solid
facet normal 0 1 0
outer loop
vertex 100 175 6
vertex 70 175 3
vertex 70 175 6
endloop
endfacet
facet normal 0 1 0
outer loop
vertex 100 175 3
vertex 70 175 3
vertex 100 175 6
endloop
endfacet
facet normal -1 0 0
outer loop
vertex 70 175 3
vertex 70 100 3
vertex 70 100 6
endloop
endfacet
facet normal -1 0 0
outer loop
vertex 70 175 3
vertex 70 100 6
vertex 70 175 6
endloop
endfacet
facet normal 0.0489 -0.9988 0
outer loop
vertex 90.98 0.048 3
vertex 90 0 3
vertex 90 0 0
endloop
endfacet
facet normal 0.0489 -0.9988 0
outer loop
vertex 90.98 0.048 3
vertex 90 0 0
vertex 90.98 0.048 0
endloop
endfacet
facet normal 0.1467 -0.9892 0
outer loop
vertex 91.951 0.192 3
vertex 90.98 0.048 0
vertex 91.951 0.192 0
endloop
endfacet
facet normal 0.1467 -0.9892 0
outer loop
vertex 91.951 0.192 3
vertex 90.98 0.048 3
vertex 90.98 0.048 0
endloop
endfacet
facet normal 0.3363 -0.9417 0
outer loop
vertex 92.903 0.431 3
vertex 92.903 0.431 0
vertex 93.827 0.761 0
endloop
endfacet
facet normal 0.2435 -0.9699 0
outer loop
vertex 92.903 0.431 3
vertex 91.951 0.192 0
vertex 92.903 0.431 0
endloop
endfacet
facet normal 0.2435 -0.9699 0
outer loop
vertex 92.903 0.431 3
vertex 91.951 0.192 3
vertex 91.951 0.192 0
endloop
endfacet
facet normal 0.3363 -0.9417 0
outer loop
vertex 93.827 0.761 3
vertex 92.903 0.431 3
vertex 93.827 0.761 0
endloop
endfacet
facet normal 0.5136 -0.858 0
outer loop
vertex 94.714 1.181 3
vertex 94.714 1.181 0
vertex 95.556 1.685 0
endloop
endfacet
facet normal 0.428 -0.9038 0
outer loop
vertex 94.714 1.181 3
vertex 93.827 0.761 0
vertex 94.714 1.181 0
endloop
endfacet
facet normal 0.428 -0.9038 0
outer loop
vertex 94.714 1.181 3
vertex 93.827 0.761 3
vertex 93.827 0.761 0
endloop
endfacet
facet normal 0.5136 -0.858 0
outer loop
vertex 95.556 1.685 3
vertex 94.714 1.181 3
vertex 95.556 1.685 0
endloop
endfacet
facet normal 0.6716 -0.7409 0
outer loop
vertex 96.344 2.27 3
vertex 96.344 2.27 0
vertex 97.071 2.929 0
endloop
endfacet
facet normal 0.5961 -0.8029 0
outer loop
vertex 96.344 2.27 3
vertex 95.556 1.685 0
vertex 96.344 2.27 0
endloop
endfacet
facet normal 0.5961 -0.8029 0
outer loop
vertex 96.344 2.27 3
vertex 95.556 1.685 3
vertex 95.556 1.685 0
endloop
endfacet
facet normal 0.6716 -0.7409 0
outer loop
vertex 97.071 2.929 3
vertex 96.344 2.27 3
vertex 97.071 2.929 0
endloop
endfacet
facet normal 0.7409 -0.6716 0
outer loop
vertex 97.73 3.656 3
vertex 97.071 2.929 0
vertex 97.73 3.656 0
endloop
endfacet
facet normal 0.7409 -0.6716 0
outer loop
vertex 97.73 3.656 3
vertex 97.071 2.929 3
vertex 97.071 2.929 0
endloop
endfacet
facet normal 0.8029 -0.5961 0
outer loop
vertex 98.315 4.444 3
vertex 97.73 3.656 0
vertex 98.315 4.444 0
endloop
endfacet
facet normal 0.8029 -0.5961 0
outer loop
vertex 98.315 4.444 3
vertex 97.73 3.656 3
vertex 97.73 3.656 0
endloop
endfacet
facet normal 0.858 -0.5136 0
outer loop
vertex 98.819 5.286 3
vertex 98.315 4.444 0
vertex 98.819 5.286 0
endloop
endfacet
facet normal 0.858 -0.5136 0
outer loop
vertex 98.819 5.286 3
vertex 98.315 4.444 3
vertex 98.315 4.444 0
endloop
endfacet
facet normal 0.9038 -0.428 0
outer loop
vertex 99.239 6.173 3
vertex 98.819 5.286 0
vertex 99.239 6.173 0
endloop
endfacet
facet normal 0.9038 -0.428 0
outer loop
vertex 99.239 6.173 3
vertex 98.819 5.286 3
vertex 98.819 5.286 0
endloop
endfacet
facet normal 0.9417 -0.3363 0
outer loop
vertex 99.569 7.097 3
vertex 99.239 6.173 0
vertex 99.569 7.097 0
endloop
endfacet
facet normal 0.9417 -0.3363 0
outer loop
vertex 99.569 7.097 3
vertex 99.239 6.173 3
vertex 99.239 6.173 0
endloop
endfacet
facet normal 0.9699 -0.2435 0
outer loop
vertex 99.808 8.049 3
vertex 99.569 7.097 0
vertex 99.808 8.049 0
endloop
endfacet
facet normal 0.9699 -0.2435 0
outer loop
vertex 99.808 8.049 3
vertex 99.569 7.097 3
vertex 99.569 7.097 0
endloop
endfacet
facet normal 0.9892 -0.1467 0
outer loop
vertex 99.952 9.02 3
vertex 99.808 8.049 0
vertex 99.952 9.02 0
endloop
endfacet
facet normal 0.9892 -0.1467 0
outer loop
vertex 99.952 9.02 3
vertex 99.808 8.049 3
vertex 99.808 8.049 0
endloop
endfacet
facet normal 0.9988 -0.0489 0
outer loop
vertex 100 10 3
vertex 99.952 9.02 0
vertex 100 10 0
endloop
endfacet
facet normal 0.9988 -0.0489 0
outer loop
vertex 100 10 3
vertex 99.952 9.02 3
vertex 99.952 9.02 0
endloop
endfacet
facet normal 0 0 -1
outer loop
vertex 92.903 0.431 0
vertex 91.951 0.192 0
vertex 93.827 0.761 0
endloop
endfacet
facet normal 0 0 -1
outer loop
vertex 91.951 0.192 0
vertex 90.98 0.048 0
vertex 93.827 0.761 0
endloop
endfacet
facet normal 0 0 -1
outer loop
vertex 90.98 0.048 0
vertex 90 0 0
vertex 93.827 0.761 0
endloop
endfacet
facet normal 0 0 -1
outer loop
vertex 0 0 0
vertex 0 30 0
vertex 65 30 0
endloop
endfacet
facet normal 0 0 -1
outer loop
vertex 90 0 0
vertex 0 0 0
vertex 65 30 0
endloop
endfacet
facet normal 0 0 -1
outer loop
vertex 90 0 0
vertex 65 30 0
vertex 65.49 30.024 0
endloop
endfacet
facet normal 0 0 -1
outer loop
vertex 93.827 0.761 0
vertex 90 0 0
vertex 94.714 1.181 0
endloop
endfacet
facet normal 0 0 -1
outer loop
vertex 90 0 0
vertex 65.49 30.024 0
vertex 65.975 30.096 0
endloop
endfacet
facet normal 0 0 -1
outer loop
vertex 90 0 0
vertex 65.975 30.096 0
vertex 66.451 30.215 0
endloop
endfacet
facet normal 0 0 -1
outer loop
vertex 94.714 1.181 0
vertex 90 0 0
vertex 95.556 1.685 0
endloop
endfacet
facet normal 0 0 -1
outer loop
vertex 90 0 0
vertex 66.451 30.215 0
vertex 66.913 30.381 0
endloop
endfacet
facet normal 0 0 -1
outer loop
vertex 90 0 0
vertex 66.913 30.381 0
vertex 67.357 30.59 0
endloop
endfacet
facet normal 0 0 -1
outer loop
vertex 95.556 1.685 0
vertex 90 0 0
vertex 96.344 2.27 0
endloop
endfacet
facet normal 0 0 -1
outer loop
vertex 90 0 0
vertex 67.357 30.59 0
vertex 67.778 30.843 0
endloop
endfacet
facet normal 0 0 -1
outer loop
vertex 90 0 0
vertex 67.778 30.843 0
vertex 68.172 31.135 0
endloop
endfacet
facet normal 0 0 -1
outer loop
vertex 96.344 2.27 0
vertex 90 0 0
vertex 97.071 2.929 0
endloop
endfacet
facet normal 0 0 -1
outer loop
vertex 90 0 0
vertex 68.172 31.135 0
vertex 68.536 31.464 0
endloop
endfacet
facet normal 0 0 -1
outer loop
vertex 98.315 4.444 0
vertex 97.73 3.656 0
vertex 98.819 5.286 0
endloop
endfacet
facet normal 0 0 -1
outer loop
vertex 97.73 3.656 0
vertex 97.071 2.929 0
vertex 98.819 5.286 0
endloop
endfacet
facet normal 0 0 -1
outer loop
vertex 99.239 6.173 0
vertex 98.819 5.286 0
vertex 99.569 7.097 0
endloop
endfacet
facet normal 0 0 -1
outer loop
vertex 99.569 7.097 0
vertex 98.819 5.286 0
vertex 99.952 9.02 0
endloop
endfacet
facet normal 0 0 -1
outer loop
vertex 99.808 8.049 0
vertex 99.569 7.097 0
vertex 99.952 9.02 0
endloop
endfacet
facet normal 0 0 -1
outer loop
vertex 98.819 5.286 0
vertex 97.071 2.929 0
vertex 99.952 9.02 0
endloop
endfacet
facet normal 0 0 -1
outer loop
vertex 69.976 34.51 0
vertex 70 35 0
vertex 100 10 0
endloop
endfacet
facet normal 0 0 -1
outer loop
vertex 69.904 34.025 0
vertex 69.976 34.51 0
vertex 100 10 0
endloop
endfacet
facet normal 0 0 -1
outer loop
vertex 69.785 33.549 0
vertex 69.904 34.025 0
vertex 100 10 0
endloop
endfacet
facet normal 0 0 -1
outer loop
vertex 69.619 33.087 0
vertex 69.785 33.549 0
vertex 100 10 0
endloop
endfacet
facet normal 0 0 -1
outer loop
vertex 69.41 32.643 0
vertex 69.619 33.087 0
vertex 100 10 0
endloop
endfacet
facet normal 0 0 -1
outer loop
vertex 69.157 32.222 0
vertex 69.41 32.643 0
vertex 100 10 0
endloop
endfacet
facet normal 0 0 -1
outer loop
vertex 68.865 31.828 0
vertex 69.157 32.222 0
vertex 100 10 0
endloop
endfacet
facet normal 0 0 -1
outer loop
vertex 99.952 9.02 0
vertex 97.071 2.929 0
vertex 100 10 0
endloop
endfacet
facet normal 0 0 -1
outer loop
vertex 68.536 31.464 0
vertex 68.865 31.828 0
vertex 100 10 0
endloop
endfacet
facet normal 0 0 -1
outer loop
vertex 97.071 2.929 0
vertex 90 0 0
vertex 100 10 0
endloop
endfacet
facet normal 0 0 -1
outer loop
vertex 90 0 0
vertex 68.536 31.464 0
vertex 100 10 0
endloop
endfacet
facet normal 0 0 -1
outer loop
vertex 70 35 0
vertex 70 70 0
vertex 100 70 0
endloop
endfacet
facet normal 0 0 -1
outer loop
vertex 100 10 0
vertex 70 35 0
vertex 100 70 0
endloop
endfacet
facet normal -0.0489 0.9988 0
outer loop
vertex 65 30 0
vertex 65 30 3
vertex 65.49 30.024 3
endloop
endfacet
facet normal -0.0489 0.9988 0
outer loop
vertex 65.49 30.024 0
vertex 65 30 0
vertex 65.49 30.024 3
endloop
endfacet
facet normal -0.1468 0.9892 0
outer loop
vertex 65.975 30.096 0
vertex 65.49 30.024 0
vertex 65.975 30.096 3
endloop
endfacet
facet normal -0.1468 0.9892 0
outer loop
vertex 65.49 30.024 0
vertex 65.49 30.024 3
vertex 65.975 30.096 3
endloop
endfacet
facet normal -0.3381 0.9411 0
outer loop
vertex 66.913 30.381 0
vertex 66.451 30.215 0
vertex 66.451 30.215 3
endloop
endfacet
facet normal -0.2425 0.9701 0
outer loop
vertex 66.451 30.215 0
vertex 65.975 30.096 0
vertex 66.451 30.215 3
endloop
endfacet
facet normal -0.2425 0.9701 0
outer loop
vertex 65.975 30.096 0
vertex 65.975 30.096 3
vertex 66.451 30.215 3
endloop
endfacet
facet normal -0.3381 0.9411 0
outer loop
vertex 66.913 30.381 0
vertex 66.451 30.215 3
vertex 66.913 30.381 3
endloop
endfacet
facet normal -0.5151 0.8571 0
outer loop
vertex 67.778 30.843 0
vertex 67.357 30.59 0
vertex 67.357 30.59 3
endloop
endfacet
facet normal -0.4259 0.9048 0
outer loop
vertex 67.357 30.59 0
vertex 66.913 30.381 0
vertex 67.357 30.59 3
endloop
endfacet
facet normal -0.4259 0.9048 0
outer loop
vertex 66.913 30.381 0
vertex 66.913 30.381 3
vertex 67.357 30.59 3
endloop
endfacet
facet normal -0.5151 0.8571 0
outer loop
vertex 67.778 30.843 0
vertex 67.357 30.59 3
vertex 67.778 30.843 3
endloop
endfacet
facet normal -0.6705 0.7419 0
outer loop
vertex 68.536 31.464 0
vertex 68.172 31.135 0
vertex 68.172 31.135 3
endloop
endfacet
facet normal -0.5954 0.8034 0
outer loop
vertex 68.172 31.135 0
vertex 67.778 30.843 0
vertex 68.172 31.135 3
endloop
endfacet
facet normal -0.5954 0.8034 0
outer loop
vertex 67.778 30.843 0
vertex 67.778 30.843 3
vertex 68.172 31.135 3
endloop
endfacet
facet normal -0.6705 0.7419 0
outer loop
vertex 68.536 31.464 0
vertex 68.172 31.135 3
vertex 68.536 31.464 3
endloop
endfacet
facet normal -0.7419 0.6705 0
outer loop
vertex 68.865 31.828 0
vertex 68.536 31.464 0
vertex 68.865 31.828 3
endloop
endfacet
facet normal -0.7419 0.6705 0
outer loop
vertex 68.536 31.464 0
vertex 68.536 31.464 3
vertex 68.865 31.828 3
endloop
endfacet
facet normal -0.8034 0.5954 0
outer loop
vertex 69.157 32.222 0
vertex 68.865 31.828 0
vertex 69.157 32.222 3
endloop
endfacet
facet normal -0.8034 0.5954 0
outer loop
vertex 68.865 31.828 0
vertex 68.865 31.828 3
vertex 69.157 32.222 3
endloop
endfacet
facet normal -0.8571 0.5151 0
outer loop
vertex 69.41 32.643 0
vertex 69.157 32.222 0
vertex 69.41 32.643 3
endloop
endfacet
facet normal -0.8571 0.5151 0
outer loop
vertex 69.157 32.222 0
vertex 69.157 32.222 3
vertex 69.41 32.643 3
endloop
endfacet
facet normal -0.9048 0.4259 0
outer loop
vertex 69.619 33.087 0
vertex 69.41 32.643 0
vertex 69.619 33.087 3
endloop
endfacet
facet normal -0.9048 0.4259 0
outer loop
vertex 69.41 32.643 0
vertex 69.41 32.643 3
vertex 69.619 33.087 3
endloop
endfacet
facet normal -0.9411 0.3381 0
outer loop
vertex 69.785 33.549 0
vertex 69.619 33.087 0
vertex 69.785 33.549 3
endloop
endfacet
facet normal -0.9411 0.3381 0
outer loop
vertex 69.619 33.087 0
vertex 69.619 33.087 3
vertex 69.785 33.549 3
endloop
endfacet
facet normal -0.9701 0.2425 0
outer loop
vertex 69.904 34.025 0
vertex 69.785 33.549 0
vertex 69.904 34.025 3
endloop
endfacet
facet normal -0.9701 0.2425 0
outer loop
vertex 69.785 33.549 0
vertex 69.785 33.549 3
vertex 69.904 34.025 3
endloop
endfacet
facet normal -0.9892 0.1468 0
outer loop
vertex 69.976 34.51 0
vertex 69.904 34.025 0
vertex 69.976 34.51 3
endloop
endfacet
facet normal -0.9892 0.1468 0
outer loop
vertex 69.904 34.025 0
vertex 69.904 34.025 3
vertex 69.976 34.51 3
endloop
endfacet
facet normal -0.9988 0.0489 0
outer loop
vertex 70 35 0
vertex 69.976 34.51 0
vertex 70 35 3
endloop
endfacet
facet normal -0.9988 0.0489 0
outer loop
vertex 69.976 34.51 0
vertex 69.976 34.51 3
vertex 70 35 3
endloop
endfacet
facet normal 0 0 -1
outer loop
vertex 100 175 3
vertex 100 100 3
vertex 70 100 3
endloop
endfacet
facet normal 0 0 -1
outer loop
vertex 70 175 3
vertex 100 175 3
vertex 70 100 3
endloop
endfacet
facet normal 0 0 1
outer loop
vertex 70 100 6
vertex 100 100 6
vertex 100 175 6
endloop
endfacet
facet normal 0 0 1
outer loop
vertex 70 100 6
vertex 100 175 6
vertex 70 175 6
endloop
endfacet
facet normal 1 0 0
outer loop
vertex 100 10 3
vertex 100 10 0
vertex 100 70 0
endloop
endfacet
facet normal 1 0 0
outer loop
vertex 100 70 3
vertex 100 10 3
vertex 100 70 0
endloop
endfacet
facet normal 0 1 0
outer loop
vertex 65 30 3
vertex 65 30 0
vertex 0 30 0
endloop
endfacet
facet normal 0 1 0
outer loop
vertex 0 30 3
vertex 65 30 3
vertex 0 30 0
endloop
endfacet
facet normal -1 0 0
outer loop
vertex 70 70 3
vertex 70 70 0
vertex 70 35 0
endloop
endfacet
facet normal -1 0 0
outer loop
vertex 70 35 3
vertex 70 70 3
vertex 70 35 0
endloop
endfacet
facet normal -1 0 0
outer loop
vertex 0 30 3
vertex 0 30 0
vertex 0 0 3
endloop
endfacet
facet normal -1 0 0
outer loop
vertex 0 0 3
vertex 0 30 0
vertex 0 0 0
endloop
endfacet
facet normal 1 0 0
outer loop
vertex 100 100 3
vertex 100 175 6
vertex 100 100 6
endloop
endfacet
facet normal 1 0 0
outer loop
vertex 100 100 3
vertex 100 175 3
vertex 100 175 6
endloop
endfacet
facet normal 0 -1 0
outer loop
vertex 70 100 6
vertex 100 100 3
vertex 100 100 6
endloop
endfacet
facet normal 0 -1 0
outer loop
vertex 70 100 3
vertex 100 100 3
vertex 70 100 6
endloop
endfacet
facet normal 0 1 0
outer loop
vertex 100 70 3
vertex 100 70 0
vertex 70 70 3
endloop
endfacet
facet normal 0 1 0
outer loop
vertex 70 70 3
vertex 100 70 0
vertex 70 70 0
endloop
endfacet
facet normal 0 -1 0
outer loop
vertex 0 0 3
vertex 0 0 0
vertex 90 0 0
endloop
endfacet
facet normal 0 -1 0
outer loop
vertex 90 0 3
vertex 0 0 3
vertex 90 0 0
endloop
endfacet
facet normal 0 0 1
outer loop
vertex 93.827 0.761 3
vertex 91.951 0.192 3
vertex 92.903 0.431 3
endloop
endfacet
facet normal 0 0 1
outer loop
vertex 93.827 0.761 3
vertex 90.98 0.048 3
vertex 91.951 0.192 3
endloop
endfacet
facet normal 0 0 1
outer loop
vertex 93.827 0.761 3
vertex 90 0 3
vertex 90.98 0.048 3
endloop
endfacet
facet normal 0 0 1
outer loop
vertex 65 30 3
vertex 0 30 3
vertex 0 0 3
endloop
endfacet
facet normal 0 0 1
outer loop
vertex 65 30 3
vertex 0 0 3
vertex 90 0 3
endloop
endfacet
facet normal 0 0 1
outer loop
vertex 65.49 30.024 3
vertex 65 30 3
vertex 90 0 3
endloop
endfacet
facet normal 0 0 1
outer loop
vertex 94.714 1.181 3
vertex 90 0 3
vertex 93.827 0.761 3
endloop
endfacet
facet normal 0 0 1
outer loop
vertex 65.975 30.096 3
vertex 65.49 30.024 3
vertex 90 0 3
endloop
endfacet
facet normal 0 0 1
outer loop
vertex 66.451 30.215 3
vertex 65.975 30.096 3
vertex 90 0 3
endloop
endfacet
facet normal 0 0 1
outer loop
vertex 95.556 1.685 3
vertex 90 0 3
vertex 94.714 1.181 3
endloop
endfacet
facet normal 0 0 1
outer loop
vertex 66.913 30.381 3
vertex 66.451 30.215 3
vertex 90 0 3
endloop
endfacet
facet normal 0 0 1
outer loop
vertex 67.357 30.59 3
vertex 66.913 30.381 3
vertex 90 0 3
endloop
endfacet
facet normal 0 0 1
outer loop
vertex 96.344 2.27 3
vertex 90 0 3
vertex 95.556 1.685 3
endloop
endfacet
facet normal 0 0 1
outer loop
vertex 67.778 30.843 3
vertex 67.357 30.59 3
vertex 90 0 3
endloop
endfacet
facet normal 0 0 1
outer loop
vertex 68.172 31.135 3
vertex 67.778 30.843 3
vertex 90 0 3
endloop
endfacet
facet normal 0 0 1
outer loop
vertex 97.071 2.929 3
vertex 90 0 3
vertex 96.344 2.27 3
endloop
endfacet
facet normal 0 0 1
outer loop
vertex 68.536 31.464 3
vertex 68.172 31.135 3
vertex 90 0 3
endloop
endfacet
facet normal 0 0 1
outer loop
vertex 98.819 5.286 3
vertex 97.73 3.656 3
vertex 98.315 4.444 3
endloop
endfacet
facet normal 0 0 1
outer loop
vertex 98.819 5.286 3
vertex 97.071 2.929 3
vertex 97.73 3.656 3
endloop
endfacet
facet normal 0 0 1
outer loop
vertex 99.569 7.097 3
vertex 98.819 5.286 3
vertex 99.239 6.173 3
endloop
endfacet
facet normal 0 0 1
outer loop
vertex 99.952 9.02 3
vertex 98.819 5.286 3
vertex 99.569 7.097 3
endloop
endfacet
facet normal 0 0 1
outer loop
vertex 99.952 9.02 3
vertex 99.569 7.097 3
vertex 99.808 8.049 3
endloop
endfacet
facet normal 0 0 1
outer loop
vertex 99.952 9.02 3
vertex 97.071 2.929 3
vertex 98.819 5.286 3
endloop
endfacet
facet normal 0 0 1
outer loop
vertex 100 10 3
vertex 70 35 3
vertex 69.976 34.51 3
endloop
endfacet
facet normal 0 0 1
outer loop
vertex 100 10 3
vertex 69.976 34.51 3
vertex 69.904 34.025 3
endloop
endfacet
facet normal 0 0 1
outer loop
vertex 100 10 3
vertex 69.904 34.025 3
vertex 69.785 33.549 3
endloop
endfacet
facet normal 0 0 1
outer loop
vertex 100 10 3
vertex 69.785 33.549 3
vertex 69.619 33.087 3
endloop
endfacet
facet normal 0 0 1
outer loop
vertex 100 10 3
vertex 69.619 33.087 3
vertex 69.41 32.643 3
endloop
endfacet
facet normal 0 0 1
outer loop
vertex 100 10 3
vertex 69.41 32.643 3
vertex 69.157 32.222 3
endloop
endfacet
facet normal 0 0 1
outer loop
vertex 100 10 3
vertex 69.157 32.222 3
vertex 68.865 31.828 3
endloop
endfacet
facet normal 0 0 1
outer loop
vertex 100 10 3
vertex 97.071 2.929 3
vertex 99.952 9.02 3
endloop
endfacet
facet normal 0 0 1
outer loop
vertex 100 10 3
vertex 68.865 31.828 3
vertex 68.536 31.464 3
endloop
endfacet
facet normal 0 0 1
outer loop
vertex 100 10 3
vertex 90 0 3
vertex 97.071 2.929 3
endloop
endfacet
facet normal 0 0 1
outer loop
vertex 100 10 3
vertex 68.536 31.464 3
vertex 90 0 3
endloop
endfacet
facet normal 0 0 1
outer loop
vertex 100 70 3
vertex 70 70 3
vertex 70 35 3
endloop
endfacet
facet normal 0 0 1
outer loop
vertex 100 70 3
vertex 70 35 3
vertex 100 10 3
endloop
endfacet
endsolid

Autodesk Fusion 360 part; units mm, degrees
sketch "Sketch1" plane through (0, 0, 0) normal (0, 0, 1) x (1, 0, 0)
  line L0 (0, 0) -> (100, 0)
  line L1 (100, 0) -> (100, 70)
  line L2 (100, 70) -> (70, 70)
  line L3 (70, 70) -> (70, 30)
  line L4 (70, 30) -> (0, 30)
  line L5 (0, 30) -> (0, 0)
  line L6 (-25, 0) -> (-25, 55) construction
  dimension "d1" = 30
  dimension "d2" = 30
  dimension "d3" = 100
  dimension "d4" = 70
extrude "Extrude1" add sketch "Sketch1" along normal blind 3 makes body 1
ref_plane "WorkPlane1" through (-30, 0, 0) normal (1, 0, 0) x (0, 1, 0)
sketch "Sketch2" plane through (0, 0, 3) normal (0, 0, 1) x (-1, 0, 0)
  line L0 (0, -30) -> (0, 0)
  line L1 (0, 0) -> (-100, 0)
  line L2 (-100, 0) -> (-100, -70)
  line L3 (-100, -70) -> (-70, -70)
  line L4 (-70, -70) -> (-70, -30)
  line L5 (-70, -30) -> (0, -30)
  line L6 (-100, -100) -> (-70, -100)
  line L7 (-70, -100) -> (-70, -175)
  line L8 (-70, -175) -> (-100, -175)
  line L9 (-100, -175) -> (-100, -100)
  dimension "d10" = 30
  dimension "d11" = 75
extrude "Extrude2" add sketch "Sketch2" along normal blind 3 separate body contours L6 L7 L8 L9 makes body 2
fillet "Fillet1" radius 10 1 edges at (100, 0, 1.5) on bodies 1
fillet "Fillet2" radius 5 1 edges at (70, 30, 1.5) on bodies 1
sketch "Sketch3" plane through (0, 0, 6) normal (0, 0, 1) x (-1, 0, 0)
  line L0 (-100, -175) -> (-70, -175)
  line L1 (-70, -175) -> (-70, -100)
  line L2 (-70, -100) -> (-100, -100)
  line L3 (-100, -100) -> (-100, -175)
  circle A0 centre (-92, -108) radius 5.6569
  line L4 (-70, -175) -> (-100, -100) construction
  line L5 (-70, -100) -> (-100, -175) construction
  line L6 (-85, -137.5) -> (-100, -137.5) construction
  circle A1 centre (-90, -10) radius 7.0711
  circle A2 centre (-92, -62) radius 5.6189
  circle A3 centre (-8, -8) radius 5.5698
  line L7 (-100, -10) -> (-100, -70)
  line L8 (-100, -70) -> (-70, -70)
  line L9 (0, 0) -> (-90, 0)
  line L10 (0, -30) -> (0, 0)
  circle A4 centre (-92, -167) radius 5.6569
  dimension "d18" = 8
  dimension "d19" = 8
  dimension "d20" = 8
  dimension "d21" = 8
  dimension "d22" = 10
  dimension "d23" = 10
  dimension "d24" = 8
  dimension "d25" = 8
